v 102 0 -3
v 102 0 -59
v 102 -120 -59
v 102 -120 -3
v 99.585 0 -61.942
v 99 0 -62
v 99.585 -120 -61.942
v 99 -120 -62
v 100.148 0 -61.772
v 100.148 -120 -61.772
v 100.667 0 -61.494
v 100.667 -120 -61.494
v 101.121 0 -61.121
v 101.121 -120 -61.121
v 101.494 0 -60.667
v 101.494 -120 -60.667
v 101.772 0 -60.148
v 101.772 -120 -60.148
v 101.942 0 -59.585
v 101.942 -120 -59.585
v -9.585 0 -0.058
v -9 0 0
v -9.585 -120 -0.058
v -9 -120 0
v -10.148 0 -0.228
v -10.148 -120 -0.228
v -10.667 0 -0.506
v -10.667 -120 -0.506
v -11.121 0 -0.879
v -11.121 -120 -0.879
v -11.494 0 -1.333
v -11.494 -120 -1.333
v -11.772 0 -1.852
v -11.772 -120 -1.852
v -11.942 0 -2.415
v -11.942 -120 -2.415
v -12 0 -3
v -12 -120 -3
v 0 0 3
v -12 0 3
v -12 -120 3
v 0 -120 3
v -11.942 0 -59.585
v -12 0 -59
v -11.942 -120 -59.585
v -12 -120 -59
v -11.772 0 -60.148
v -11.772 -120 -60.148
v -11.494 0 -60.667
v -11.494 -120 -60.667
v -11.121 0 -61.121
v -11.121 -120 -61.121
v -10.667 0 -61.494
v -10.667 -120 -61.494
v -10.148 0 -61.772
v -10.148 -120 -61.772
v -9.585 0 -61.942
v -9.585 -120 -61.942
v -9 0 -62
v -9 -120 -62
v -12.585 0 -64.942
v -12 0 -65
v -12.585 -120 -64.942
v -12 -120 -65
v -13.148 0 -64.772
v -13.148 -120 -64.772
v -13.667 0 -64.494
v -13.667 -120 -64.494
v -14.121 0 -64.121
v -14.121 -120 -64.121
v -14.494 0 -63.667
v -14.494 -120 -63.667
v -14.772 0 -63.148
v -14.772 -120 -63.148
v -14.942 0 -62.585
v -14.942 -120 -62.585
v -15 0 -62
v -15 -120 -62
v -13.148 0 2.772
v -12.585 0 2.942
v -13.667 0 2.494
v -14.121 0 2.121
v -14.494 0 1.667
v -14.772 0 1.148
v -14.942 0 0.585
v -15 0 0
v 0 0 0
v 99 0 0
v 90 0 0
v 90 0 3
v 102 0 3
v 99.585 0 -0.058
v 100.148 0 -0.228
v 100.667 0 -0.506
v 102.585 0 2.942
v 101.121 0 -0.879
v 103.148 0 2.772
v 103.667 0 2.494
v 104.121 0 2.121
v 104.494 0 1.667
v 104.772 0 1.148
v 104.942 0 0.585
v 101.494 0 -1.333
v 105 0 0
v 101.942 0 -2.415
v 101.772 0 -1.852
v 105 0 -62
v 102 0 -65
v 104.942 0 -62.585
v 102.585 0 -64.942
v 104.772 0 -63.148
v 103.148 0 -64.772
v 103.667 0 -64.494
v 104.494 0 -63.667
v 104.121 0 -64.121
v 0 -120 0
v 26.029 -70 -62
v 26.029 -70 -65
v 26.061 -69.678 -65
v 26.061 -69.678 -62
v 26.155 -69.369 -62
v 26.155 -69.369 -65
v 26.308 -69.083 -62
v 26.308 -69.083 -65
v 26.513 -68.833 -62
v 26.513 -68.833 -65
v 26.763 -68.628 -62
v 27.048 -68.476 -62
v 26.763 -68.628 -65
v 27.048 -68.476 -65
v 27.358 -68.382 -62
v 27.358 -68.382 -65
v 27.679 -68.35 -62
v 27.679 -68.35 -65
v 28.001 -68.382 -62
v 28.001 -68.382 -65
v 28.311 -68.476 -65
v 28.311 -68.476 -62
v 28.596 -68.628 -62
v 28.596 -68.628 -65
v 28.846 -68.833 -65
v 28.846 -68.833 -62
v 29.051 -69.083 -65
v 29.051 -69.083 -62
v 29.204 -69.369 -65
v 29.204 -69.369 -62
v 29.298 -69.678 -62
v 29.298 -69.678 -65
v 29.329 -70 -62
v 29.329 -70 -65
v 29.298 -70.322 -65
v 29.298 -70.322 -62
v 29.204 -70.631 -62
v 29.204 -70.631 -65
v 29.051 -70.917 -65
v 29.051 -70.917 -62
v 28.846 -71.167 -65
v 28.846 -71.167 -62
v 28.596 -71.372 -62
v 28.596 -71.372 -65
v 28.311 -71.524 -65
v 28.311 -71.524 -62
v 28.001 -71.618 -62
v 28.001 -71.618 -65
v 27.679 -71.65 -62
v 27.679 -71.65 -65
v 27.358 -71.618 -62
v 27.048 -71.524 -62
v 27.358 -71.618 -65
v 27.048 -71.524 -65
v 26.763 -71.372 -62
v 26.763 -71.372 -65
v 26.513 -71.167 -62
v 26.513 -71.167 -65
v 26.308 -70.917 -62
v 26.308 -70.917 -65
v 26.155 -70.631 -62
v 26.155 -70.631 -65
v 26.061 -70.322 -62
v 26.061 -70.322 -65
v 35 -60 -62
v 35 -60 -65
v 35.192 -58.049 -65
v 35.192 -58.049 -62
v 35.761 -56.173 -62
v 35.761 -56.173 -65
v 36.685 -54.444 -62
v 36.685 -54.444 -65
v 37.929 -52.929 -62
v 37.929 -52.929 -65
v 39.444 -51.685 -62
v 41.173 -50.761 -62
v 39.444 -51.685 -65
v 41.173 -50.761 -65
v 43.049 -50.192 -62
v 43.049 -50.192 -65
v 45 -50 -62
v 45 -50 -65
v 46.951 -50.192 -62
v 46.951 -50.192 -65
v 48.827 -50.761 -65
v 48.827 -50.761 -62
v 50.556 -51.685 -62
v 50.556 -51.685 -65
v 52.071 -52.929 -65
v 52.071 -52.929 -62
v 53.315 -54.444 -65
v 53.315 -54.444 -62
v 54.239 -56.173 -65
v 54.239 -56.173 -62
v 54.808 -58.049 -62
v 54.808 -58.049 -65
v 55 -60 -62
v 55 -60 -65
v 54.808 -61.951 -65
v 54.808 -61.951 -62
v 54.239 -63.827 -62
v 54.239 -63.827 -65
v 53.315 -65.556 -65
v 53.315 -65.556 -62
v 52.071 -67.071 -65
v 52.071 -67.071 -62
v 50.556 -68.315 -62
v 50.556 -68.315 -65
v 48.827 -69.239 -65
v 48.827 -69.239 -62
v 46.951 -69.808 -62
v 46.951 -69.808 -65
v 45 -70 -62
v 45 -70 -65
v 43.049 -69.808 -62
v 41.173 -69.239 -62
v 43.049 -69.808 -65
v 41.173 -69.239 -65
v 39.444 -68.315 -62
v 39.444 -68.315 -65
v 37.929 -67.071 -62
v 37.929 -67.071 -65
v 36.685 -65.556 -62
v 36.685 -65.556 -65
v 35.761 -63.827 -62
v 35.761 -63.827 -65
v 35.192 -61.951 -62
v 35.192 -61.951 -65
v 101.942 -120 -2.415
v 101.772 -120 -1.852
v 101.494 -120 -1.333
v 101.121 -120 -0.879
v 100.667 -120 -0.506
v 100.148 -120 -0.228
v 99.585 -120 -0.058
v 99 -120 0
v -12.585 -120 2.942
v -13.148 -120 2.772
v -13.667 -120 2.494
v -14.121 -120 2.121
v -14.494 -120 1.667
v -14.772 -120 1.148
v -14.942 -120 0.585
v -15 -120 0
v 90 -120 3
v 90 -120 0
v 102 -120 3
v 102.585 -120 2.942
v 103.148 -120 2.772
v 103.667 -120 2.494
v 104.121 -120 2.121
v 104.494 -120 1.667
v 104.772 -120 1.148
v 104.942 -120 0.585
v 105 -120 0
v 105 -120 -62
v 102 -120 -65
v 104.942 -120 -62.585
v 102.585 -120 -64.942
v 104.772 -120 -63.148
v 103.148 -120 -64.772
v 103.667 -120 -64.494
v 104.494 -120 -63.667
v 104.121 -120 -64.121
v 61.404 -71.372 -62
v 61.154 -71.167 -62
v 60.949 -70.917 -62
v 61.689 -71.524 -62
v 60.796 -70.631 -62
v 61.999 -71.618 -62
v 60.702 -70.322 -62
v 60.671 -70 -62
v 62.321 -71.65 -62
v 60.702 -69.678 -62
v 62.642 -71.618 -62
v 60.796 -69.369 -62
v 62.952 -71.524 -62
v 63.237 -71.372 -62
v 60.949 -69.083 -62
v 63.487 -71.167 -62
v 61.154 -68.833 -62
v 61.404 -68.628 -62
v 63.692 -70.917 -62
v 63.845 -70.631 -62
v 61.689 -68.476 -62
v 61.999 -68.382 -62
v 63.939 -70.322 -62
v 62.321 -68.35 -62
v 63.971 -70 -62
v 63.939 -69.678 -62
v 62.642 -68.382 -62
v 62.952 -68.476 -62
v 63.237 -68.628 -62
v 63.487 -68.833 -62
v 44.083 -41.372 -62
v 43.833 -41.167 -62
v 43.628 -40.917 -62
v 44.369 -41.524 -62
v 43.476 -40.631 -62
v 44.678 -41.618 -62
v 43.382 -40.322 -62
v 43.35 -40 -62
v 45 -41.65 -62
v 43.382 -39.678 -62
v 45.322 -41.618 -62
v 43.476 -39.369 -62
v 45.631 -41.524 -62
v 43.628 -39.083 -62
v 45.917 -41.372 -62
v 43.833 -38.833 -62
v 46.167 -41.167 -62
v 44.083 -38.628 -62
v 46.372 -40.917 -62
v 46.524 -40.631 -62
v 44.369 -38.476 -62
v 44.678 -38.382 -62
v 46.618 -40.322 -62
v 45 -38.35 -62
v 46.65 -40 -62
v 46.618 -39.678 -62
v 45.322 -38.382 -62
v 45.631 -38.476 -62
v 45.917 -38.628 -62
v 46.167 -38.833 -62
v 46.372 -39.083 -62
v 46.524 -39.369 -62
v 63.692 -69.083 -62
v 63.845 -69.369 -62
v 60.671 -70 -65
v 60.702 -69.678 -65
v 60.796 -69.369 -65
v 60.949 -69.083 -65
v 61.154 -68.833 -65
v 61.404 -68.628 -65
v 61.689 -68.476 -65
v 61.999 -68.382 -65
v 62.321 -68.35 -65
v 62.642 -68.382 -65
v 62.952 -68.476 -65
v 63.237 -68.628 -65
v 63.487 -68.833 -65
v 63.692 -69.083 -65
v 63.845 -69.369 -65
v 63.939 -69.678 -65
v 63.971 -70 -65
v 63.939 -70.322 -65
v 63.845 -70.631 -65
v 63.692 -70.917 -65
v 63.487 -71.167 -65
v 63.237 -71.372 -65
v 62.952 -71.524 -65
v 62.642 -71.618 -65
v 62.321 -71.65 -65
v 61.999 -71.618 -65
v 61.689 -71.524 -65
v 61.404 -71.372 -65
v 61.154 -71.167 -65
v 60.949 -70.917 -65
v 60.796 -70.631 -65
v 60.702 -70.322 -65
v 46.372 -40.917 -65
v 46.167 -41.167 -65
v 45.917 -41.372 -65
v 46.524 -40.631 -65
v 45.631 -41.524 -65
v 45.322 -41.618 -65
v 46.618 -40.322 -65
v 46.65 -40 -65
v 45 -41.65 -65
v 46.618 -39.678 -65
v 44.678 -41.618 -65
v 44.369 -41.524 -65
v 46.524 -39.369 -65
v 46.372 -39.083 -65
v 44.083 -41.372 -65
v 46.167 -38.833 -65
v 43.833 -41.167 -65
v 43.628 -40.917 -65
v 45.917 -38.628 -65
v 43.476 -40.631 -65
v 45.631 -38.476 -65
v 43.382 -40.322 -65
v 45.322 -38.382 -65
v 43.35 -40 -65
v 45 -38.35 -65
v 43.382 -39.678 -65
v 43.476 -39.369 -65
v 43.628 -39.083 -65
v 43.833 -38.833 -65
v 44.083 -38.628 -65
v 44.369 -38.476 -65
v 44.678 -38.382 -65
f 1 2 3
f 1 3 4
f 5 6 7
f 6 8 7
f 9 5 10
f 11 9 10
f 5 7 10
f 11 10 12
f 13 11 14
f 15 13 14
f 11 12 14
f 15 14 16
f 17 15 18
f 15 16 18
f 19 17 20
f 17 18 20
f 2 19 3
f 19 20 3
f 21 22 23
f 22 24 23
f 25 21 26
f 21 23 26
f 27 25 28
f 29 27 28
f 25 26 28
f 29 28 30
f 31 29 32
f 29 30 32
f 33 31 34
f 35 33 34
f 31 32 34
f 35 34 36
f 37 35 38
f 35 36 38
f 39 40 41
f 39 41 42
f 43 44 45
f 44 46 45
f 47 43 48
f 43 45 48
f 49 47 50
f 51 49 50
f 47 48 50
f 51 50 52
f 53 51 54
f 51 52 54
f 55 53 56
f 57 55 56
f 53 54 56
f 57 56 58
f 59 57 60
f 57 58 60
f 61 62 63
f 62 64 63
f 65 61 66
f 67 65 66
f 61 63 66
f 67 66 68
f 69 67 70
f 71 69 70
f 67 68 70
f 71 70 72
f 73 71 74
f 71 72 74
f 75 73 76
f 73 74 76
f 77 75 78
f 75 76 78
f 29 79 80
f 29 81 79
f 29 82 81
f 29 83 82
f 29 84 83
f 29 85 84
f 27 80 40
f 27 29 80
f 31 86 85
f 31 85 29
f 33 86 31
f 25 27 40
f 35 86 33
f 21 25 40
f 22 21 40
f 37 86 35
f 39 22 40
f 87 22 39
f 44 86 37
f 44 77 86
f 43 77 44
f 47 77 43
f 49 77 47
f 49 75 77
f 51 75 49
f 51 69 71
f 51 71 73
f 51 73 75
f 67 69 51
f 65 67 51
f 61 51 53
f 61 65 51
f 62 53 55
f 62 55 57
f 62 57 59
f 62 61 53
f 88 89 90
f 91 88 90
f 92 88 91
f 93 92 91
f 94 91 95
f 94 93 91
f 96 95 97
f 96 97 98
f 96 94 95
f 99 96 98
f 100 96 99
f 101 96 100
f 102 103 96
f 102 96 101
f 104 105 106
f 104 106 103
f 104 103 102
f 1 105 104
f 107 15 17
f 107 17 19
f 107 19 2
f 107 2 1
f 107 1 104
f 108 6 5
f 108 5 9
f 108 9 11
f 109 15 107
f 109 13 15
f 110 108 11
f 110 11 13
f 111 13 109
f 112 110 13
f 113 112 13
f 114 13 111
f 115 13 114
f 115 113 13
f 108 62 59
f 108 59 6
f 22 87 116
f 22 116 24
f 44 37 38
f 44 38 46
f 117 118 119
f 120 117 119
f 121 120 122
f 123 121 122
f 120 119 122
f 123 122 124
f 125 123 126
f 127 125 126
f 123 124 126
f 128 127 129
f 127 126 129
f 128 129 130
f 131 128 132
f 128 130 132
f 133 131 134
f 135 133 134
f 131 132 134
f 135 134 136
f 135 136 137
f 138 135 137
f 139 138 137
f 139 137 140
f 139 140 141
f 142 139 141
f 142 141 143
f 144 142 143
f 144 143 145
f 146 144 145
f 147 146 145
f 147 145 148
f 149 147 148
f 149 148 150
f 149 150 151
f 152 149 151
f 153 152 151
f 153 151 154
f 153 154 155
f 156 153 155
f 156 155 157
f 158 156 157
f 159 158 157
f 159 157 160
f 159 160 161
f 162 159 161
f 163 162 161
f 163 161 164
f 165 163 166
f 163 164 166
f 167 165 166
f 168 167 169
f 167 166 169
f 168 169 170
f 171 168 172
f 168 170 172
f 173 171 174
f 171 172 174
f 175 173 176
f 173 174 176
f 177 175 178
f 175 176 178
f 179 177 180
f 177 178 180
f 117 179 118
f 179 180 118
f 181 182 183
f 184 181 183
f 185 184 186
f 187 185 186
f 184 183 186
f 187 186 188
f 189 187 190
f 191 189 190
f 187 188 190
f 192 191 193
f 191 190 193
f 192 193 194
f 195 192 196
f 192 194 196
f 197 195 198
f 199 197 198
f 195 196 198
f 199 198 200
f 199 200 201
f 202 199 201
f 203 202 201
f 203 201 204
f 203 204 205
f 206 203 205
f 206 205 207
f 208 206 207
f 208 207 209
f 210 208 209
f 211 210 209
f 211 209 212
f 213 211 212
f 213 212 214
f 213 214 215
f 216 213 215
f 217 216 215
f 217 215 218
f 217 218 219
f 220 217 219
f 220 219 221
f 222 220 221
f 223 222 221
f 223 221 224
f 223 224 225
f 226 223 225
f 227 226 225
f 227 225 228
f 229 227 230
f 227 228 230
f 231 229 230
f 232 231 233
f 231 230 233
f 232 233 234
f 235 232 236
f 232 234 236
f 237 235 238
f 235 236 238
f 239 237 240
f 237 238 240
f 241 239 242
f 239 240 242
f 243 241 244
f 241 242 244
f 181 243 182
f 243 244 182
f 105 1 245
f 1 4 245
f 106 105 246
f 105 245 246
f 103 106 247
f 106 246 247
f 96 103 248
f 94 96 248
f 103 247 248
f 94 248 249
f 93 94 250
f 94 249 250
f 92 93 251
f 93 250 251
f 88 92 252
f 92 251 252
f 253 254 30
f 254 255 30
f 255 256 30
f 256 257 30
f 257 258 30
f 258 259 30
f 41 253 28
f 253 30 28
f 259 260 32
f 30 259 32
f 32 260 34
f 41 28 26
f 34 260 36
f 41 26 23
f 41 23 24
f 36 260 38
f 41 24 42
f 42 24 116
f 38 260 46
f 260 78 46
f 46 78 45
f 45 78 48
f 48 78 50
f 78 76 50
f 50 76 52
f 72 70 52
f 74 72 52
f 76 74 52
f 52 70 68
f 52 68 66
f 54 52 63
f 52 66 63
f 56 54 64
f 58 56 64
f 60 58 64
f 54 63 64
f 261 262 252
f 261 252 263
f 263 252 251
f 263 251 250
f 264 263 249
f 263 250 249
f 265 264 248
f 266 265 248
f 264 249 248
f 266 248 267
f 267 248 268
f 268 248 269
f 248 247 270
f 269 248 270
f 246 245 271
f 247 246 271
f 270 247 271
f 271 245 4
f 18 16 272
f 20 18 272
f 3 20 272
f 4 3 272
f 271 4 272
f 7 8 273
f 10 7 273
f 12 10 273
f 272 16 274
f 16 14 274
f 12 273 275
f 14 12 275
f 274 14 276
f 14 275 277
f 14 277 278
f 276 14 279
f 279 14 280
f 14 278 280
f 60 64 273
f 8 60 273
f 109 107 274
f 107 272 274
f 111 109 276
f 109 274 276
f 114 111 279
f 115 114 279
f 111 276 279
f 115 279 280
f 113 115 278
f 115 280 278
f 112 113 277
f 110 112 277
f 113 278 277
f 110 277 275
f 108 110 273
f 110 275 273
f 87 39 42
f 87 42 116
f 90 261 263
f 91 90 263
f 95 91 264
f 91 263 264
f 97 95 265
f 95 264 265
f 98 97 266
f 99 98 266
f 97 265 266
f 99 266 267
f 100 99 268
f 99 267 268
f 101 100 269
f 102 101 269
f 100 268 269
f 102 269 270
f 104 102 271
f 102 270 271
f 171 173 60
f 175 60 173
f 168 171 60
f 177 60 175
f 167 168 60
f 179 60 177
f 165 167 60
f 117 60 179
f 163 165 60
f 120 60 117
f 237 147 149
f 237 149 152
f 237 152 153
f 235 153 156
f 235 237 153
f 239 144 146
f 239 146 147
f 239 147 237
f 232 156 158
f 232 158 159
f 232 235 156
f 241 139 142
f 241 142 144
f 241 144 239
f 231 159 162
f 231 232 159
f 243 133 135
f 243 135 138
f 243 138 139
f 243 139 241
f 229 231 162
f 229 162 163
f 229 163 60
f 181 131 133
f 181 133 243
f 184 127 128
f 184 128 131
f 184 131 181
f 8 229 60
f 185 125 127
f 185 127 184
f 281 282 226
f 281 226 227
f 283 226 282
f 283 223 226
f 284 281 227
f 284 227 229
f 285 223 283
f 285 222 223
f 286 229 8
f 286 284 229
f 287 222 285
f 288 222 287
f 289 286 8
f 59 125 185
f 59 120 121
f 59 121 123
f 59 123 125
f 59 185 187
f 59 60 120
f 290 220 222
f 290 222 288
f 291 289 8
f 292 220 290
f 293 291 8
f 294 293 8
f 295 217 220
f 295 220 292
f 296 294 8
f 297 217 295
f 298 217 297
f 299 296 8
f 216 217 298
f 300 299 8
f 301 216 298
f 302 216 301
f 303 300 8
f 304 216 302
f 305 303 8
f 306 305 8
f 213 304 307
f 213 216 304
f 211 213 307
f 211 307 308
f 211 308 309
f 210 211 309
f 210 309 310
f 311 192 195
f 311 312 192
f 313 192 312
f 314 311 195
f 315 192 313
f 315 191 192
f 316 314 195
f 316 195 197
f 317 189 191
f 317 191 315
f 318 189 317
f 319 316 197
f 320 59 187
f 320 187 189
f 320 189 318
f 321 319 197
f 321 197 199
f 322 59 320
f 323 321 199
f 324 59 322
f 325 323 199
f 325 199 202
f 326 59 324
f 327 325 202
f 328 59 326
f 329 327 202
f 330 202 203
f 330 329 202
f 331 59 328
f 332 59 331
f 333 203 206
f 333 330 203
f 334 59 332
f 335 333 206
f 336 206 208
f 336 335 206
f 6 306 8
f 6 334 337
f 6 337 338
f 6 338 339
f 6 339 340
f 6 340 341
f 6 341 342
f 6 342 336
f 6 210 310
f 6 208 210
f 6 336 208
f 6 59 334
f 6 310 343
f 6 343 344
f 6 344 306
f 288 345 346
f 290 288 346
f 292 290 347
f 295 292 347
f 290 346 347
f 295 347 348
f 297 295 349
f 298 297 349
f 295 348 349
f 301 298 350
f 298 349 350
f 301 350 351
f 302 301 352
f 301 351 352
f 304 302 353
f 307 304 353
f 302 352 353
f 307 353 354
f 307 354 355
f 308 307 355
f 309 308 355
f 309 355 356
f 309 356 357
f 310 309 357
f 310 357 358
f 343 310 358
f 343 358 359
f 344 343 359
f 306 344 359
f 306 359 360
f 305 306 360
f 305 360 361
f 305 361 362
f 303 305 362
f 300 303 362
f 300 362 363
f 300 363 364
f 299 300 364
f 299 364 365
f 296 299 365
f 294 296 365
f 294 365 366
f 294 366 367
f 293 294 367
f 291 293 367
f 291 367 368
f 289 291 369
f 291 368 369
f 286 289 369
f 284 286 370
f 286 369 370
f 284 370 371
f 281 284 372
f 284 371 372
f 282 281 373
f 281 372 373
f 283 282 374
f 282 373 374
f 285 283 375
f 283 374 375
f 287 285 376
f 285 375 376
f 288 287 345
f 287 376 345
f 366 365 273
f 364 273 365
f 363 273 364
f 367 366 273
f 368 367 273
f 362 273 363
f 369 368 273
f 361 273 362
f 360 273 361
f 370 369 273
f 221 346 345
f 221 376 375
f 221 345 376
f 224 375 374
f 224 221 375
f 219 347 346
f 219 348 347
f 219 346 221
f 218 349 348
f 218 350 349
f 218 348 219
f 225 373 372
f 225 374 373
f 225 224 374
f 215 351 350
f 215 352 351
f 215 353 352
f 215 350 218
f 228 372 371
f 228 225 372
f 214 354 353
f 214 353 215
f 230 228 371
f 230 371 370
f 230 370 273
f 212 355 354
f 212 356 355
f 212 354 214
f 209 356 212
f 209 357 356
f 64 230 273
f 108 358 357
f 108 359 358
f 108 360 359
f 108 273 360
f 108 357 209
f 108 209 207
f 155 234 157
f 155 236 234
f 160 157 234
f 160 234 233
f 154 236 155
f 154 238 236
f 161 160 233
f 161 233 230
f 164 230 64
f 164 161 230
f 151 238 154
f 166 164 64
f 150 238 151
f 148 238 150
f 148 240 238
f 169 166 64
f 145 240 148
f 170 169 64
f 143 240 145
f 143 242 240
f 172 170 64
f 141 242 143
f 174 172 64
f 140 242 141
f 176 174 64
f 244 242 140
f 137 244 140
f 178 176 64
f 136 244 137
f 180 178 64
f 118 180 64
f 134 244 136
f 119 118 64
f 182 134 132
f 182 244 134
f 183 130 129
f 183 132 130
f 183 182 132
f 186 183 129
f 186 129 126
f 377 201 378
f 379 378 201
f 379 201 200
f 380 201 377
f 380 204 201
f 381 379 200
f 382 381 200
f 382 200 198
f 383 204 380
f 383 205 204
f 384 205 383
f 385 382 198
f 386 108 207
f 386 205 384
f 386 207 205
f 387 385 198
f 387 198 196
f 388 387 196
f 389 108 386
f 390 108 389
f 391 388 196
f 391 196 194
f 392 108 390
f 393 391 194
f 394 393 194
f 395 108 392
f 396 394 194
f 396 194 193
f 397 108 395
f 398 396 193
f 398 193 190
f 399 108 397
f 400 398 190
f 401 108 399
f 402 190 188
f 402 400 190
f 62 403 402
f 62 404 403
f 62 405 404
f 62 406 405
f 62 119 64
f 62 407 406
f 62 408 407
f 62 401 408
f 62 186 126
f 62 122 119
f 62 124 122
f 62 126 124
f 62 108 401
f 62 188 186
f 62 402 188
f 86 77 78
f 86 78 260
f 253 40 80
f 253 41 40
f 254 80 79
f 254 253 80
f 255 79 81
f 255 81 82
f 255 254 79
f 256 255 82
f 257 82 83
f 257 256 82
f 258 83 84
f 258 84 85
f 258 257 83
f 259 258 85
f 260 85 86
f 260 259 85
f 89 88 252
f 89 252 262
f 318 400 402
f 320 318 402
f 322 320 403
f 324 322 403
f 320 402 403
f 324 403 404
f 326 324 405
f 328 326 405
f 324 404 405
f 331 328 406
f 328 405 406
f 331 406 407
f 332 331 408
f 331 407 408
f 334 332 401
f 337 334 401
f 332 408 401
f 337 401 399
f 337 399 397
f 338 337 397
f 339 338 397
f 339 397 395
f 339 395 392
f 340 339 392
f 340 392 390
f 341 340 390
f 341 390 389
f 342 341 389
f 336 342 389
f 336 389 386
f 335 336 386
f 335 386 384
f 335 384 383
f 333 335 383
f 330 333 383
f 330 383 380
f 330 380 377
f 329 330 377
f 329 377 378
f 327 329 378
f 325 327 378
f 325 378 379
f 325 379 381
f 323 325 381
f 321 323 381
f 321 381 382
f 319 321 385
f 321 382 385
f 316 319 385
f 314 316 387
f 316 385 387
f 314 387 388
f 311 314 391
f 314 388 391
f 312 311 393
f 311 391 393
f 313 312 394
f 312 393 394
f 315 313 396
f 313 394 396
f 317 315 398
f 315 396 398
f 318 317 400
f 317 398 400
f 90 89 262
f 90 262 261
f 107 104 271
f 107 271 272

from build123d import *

# Parameters (mm, degrees)
SM_BASE_FLANGE_1_DEPTH = 120
SKETCH_6_R             = 10
SKETCH_6_R_2           = 1.65
CUT_EXTRUDE_1_DEPTH    = 10
FILLET_1_R             = 3


# Sheet-metal steps are written as plain solids
with BuildPart() as part:
    # Sketch 1 → 基体-法兰1 (new body)
    with BuildSketch(Plane(origin=(0, 0, 0), x_dir=(1, 0, 0), z_dir=(0, 1, 0))):
        Polygon((0, 0), (-12, 0), (-12, 62), (102, 62), (102, 0), (90, 0), (90, -3), (105, -3), (105, 65), (-15, 65), (-15, -3), (0, -3), align=None)
    extrude(amount=-SM_BASE_FLANGE_1_DEPTH)

    # 草图6 → 切除-拉伸1 (cut)
    with BuildSketch(Plane(origin=(0, 0, -65), x_dir=(-1, 0, 0), z_dir=(0, 0, -1))):
        with Locations((-45, -60)):
            Circle(SKETCH_6_R)
        with Locations((-62.320508076, -70)):
            Circle(SKETCH_6_R_2)
        with Locations((-45, -40)):
            Circle(SKETCH_6_R_2)
        with Locations((-27.679491924, -70)):
            Circle(SKETCH_6_R_2)
    extrude(amount=-CUT_EXTRUDE_1_DEPTH, mode=Mode.SUBTRACT)

    # 圆角1
    fillet_1_edges = [part.edges().sort_by_distance(p)[0] for p in [
        (-15, -60, 3),
        (-15, -60, -65),
        (105, -60, -65),
        (105, -60, 3),
        (102, -60, 0),
        (102, -60, -62),
        (-12, -60, -62),
        (-12, -60, 0),
    ]]
    fillet(fillet_1_edges, radius=FILLET_1_R)


solid = part.part
